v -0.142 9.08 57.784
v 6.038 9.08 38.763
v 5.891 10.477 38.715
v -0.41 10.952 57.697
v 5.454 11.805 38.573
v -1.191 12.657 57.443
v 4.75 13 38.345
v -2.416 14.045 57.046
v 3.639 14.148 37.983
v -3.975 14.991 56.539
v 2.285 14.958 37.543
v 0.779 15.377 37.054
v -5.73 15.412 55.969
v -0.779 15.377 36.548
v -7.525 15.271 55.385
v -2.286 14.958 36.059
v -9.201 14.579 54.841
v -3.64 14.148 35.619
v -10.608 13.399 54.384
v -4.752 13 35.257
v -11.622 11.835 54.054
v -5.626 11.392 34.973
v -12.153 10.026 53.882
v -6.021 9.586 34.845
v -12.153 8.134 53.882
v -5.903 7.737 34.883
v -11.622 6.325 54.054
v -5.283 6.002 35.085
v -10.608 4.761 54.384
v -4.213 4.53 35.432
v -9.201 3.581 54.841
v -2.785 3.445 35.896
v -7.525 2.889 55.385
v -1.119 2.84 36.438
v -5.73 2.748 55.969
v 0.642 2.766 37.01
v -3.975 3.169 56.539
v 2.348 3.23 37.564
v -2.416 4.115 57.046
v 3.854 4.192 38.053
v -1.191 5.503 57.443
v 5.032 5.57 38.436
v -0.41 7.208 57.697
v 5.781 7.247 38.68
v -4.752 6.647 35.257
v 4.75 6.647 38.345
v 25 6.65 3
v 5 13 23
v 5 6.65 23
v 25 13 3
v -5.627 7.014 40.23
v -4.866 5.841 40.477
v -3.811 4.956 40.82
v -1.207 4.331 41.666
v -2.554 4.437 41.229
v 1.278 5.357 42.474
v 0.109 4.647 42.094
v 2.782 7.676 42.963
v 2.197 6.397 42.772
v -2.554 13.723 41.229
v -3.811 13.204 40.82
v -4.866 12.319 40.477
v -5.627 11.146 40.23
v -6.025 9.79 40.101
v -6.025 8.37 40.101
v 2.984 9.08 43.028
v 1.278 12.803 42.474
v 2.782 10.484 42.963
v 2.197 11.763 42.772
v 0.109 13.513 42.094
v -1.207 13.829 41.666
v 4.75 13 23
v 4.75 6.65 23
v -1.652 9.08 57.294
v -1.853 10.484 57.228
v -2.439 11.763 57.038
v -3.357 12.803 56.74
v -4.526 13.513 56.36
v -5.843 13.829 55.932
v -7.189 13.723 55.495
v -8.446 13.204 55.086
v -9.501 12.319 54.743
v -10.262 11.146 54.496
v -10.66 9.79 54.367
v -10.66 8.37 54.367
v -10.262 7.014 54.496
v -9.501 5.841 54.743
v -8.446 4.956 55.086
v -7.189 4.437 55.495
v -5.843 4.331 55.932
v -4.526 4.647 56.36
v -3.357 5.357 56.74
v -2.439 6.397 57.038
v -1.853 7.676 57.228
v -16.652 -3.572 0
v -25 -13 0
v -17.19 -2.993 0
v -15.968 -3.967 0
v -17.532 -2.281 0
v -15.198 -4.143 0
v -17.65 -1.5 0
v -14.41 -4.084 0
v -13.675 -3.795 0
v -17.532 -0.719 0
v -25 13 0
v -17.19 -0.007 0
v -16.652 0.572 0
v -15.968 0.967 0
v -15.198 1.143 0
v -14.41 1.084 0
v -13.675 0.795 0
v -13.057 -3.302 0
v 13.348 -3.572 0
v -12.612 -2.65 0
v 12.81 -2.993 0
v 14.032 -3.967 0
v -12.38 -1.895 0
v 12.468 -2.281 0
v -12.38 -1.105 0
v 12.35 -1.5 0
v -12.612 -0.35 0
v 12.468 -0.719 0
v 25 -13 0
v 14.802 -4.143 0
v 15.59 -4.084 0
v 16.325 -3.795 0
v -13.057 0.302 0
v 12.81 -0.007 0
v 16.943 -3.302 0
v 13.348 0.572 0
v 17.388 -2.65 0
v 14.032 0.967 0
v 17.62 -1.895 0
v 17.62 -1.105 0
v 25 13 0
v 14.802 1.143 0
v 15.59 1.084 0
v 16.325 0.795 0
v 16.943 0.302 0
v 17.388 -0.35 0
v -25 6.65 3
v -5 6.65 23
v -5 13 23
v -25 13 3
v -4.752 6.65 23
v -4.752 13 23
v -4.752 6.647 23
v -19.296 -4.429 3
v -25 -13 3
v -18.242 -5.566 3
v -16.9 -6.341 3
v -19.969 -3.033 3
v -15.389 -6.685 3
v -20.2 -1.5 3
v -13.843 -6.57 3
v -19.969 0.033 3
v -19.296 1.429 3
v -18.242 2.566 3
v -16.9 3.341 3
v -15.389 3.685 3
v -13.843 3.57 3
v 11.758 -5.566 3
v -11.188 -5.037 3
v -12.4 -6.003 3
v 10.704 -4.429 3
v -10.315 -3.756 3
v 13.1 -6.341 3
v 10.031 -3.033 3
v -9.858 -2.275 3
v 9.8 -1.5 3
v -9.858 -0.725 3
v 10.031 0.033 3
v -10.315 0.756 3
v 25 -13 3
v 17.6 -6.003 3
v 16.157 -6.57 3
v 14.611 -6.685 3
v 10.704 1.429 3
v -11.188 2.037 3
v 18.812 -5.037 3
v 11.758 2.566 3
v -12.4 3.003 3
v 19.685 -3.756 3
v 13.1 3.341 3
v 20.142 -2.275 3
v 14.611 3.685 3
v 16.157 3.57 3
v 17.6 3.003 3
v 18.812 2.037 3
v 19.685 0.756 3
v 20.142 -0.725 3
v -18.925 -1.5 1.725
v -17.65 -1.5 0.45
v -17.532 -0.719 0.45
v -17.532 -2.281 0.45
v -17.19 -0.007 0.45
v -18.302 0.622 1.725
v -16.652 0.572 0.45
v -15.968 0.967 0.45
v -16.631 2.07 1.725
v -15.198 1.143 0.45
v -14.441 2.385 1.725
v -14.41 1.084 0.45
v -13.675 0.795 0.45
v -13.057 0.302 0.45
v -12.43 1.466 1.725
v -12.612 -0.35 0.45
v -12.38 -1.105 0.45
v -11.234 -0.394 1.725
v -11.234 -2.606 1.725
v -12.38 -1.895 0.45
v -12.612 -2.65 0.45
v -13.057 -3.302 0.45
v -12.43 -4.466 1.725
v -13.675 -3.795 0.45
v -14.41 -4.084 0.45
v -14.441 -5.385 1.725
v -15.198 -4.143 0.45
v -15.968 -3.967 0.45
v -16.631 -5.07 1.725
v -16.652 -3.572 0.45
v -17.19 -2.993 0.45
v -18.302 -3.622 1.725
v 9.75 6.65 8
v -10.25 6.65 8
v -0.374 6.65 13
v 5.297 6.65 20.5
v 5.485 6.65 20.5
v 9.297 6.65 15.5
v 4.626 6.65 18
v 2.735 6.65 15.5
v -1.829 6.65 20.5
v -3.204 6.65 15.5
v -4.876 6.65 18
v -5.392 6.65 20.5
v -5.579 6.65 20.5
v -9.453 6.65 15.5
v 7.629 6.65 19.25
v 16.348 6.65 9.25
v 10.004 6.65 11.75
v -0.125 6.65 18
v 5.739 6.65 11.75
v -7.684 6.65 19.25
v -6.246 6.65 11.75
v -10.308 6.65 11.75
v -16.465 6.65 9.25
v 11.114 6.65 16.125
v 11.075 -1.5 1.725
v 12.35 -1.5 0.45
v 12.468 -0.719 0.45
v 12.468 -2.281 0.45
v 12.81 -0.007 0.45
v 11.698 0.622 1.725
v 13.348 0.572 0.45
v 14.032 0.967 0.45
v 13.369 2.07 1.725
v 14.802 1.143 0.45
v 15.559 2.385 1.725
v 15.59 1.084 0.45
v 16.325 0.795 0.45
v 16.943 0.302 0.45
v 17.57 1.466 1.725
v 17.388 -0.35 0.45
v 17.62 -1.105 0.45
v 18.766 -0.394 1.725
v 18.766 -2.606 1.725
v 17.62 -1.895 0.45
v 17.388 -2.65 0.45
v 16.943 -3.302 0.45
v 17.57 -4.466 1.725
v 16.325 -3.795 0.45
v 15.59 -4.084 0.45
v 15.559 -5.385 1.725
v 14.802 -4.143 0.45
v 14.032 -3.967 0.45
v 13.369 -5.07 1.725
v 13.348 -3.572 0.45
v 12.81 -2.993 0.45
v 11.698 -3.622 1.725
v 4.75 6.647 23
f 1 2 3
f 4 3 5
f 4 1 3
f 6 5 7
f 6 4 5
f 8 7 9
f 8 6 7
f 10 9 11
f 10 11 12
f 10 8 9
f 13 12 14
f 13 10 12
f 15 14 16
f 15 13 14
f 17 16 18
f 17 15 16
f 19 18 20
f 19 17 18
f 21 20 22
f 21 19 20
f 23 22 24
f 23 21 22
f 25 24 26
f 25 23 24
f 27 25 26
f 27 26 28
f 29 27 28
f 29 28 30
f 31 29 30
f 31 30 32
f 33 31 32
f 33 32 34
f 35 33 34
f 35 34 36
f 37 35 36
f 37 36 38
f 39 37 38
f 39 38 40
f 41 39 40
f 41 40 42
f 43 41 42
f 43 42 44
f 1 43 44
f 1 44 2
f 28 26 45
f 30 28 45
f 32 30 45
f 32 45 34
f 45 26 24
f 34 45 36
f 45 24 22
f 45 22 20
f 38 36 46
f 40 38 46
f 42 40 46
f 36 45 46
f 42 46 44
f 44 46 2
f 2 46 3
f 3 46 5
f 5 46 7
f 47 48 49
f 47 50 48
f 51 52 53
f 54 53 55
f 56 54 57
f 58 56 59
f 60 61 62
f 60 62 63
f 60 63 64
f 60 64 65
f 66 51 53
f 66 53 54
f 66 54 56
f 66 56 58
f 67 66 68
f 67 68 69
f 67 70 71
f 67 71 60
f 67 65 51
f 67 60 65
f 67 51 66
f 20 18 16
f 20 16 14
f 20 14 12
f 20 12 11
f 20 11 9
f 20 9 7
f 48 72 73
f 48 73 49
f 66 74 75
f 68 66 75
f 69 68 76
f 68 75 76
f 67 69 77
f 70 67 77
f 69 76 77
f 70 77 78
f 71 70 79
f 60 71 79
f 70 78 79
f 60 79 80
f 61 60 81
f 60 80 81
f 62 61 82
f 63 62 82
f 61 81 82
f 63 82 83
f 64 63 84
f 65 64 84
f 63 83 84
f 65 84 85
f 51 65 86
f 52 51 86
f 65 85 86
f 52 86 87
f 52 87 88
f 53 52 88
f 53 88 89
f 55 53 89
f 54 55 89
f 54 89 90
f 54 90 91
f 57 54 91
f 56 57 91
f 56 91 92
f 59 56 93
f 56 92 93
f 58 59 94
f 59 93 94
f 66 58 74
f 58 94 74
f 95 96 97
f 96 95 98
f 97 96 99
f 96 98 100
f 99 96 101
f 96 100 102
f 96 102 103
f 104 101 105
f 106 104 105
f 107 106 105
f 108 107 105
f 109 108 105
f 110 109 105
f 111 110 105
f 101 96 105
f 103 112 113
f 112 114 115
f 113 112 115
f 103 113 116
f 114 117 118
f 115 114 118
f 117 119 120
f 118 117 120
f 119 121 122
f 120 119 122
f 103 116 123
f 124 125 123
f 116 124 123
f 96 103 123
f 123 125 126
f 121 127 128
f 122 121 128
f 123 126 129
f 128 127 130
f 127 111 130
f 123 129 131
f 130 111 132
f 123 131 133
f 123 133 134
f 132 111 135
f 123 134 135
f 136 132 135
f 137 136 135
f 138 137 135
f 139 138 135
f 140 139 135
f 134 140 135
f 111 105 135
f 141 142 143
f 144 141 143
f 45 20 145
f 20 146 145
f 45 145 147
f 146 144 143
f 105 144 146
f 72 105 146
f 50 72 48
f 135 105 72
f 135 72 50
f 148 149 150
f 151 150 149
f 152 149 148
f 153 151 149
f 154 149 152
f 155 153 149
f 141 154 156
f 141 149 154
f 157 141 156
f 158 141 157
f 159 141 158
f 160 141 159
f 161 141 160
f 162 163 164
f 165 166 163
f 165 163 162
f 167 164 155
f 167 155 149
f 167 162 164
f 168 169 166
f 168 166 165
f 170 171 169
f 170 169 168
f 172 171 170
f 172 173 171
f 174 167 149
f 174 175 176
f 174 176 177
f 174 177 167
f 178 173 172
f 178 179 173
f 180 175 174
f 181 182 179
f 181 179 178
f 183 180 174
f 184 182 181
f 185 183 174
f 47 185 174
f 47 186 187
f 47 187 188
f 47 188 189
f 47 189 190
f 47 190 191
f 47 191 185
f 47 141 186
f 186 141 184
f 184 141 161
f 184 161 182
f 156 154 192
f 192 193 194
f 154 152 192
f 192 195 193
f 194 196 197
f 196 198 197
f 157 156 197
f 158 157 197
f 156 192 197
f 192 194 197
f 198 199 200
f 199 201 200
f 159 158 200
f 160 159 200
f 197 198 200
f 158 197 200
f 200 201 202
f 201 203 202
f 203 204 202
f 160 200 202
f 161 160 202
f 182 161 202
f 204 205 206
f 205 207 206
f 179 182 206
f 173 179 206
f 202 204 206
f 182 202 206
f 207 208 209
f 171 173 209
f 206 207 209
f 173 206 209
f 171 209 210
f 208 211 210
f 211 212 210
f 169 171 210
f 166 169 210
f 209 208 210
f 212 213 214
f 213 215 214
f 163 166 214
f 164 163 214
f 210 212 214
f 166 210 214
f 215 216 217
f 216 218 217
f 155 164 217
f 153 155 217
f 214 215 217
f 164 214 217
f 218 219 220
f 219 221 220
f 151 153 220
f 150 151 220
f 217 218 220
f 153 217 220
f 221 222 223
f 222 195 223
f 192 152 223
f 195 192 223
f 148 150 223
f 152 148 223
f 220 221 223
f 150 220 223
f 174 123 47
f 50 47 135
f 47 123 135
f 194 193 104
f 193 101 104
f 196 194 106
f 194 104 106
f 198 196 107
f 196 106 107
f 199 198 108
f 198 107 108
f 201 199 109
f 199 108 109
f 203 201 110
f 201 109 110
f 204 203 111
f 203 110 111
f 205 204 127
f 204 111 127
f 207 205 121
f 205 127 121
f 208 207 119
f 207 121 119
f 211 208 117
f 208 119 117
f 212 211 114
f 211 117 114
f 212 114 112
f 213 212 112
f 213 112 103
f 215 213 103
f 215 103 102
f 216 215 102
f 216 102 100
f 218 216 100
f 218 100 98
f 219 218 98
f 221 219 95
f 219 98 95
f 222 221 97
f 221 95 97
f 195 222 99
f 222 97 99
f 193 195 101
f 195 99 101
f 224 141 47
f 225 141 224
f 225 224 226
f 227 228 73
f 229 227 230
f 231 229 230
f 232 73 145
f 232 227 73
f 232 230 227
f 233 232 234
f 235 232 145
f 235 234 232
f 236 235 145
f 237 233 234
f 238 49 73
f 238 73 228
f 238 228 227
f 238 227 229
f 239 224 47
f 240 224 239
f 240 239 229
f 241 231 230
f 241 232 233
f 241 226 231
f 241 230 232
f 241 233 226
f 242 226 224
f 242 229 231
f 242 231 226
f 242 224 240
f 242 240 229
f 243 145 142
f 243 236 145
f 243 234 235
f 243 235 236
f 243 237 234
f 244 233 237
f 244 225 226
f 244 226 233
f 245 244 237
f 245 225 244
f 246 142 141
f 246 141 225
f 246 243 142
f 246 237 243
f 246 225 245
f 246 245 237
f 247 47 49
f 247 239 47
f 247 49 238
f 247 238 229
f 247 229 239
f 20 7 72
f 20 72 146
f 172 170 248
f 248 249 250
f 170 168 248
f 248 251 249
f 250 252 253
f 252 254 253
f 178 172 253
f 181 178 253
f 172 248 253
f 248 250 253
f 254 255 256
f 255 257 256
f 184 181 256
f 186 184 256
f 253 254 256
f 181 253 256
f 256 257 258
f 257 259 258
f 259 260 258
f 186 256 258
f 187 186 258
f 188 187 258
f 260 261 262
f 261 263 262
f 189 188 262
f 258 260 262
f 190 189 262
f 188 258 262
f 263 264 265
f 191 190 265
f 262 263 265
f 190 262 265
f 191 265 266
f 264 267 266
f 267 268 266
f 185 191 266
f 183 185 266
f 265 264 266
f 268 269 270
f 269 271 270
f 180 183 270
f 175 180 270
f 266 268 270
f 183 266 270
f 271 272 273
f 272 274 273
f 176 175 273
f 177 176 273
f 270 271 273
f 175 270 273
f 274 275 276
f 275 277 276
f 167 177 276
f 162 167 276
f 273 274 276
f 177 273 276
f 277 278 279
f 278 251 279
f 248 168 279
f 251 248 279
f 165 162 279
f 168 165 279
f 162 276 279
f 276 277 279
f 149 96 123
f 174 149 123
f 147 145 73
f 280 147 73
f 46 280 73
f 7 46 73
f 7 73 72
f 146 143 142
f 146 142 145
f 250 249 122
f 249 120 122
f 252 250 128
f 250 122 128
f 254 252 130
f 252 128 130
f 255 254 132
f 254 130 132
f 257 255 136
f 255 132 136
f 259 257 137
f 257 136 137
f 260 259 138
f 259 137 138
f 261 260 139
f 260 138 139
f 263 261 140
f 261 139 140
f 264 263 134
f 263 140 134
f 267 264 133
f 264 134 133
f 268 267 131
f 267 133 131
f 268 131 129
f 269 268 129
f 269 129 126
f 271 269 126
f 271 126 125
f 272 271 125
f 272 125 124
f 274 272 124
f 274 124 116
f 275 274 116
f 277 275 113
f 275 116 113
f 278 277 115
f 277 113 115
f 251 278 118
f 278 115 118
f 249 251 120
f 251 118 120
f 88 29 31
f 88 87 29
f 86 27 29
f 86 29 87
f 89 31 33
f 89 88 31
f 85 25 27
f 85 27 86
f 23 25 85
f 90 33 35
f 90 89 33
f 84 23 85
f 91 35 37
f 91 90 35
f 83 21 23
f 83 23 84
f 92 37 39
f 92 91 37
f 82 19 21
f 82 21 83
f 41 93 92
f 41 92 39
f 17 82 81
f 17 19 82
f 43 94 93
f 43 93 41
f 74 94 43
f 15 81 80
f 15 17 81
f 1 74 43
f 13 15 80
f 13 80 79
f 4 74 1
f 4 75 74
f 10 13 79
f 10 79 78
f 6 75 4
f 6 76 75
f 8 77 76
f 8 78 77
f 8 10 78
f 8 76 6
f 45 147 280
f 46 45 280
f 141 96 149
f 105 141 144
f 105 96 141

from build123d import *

# Parameters (mm, degrees)
BASE_W                                          = 50
BASE_H                                          = 26
BOSS_EXTRUDE2_DEPTH                             = 3
SKETCH2_R                                       = 6.35
BOSS_EXTRUDE1_DEPTH                             = 20
SKETCH7_R                                       = 4.7625
CUT_EXTRUDE1_DEPTH                              = 15
BOSS_EXTRUDE8_REACH                             = 47.531
CSK_FOR_M5_FLAT_HEAD_MACHINE_SCREW2_D           = 5.3
CSK_FOR_M5_FLAT_HEAD_MACHINE_SCREW2_DEPTH       = 10
CSK_FOR_M5_FLAT_HEAD_MACHINE_SCREW2_CSINK_D     = 10.4
CSK_FOR_M5_FLAT_HEAD_MACHINE_SCREW2_CSINK_ANGLE = 90
CSK_FOR_M5_FLAT_HEAD_MACHINE_SCREW2_TIP         = 1.59228064


with BuildPart() as part:
    # Base → Boss-Extrude2 (new body)
    with BuildSketch(Plane.XY):
        Rectangle(BASE_W, BASE_H)
    extrude(amount=BOSS_EXTRUDE2_DEPTH)

    # Sketch6 → Loft2 section 0
    with BuildSketch(Plane.XY.offset(23)):
        with BuildLine():
            Line((-5, 13), (5, 13))
            Line((5, 13), (5, 6.65))
            Line((5, 6.65), (-5, 6.65))
            Line((-5, 6.65), (-5, 13))
        make_face()
    # Sketch5 → Loft2 section 1
    with BuildSketch(Plane.XY.offset(3)):
        with BuildLine():
            Line((-25, 13), (25, 13))
            Line((25, 13), (25, 6.65))
            Line((25, 6.65), (-25, 6.65))
            Line((-25, 6.65), (-25, 13))
        make_face()
    loft()



with BuildPart() as body_2:
    # Sketch2 → Boss-Extrude1 (new body)
    with BuildSketch(Plane(origin=(-16.995934691, 0, 52.308108396), x_dir=(0.9510565162951523, 0, 0.3090169943749514), z_dir=(-0.3090169943749514, 0, 0.9510565162951523))):
        with Locations((11.371412907, 9.08)):
            Circle(SKETCH2_R)
    extrude(amount=-BOSS_EXTRUDE1_DEPTH)

    # Sketch7 → Cut-Extrude1 (cut)
    with BuildSketch(Plane(origin=(-16.995934691, 0, 52.308108396), x_dir=(0.9510565162951523, 0, 0.3090169943749514), z_dir=(-0.3090169943749514, 0, 0.9510565162951523))):
        with Locations((11.371412907, 9.08)):
            Circle(SKETCH7_R)
    extrude(amount=-CUT_EXTRUDE1_DEPTH, mode=Mode.SUBTRACT)


with BuildPart() as part_1:
    add(part.part)

    add(body_2.part)  # Boss-Extrude8 merges body 2
    # Boss-Extrude8: up to this plane
    boss_extrude8_end = Plane(origin=(-0.000738458, 9.08, 36.800937909), z_dir=(-0.3090169943749514, 0, 0.9510565162951523))
    # Sketch17 → Boss-Extrude8 (add, up to the surface)
    with BuildSketch(Plane.XY.offset(23), mode=Mode.PRIVATE) as boss_extrude8_sk1:
        Polygon((-4.751504294, 13.000455244), (-4.751504294, 6.647086382), (4.750367151, 6.647086382), (4.750367151, 13), align=None)
    boss_extrude8_tool1 = split(extrude(boss_extrude8_sk1.sketch, amount=BOSS_EXTRUDE8_REACH, mode=Mode.PRIVATE), bisect_by=boss_extrude8_end, keep=Keep.BOTH, mode=Mode.PRIVATE)
    add(boss_extrude8_tool1.solids().sort_by_distance((-0.000625, 9.823657, 23))[0])

    # CSK for M5 Flat Head Machine Screw2
    with Locations(Plane.XY.offset(3)):
        with Locations((-15, -1.5), (15, -1.5)):
            CounterSinkHole(CSK_FOR_M5_FLAT_HEAD_MACHINE_SCREW2_D / 2, CSK_FOR_M5_FLAT_HEAD_MACHINE_SCREW2_CSINK_D / 2, depth=CSK_FOR_M5_FLAT_HEAD_MACHINE_SCREW2_DEPTH, counter_sink_angle=CSK_FOR_M5_FLAT_HEAD_MACHINE_SCREW2_CSINK_ANGLE)
            with Locations((0, 0, -(CSK_FOR_M5_FLAT_HEAD_MACHINE_SCREW2_DEPTH + CSK_FOR_M5_FLAT_HEAD_MACHINE_SCREW2_TIP / 2))):  # 118° drill point
                Cone(0, CSK_FOR_M5_FLAT_HEAD_MACHINE_SCREW2_D / 2, CSK_FOR_M5_FLAT_HEAD_MACHINE_SCREW2_TIP, mode=Mode.SUBTRACT)


solid = part_1.part
